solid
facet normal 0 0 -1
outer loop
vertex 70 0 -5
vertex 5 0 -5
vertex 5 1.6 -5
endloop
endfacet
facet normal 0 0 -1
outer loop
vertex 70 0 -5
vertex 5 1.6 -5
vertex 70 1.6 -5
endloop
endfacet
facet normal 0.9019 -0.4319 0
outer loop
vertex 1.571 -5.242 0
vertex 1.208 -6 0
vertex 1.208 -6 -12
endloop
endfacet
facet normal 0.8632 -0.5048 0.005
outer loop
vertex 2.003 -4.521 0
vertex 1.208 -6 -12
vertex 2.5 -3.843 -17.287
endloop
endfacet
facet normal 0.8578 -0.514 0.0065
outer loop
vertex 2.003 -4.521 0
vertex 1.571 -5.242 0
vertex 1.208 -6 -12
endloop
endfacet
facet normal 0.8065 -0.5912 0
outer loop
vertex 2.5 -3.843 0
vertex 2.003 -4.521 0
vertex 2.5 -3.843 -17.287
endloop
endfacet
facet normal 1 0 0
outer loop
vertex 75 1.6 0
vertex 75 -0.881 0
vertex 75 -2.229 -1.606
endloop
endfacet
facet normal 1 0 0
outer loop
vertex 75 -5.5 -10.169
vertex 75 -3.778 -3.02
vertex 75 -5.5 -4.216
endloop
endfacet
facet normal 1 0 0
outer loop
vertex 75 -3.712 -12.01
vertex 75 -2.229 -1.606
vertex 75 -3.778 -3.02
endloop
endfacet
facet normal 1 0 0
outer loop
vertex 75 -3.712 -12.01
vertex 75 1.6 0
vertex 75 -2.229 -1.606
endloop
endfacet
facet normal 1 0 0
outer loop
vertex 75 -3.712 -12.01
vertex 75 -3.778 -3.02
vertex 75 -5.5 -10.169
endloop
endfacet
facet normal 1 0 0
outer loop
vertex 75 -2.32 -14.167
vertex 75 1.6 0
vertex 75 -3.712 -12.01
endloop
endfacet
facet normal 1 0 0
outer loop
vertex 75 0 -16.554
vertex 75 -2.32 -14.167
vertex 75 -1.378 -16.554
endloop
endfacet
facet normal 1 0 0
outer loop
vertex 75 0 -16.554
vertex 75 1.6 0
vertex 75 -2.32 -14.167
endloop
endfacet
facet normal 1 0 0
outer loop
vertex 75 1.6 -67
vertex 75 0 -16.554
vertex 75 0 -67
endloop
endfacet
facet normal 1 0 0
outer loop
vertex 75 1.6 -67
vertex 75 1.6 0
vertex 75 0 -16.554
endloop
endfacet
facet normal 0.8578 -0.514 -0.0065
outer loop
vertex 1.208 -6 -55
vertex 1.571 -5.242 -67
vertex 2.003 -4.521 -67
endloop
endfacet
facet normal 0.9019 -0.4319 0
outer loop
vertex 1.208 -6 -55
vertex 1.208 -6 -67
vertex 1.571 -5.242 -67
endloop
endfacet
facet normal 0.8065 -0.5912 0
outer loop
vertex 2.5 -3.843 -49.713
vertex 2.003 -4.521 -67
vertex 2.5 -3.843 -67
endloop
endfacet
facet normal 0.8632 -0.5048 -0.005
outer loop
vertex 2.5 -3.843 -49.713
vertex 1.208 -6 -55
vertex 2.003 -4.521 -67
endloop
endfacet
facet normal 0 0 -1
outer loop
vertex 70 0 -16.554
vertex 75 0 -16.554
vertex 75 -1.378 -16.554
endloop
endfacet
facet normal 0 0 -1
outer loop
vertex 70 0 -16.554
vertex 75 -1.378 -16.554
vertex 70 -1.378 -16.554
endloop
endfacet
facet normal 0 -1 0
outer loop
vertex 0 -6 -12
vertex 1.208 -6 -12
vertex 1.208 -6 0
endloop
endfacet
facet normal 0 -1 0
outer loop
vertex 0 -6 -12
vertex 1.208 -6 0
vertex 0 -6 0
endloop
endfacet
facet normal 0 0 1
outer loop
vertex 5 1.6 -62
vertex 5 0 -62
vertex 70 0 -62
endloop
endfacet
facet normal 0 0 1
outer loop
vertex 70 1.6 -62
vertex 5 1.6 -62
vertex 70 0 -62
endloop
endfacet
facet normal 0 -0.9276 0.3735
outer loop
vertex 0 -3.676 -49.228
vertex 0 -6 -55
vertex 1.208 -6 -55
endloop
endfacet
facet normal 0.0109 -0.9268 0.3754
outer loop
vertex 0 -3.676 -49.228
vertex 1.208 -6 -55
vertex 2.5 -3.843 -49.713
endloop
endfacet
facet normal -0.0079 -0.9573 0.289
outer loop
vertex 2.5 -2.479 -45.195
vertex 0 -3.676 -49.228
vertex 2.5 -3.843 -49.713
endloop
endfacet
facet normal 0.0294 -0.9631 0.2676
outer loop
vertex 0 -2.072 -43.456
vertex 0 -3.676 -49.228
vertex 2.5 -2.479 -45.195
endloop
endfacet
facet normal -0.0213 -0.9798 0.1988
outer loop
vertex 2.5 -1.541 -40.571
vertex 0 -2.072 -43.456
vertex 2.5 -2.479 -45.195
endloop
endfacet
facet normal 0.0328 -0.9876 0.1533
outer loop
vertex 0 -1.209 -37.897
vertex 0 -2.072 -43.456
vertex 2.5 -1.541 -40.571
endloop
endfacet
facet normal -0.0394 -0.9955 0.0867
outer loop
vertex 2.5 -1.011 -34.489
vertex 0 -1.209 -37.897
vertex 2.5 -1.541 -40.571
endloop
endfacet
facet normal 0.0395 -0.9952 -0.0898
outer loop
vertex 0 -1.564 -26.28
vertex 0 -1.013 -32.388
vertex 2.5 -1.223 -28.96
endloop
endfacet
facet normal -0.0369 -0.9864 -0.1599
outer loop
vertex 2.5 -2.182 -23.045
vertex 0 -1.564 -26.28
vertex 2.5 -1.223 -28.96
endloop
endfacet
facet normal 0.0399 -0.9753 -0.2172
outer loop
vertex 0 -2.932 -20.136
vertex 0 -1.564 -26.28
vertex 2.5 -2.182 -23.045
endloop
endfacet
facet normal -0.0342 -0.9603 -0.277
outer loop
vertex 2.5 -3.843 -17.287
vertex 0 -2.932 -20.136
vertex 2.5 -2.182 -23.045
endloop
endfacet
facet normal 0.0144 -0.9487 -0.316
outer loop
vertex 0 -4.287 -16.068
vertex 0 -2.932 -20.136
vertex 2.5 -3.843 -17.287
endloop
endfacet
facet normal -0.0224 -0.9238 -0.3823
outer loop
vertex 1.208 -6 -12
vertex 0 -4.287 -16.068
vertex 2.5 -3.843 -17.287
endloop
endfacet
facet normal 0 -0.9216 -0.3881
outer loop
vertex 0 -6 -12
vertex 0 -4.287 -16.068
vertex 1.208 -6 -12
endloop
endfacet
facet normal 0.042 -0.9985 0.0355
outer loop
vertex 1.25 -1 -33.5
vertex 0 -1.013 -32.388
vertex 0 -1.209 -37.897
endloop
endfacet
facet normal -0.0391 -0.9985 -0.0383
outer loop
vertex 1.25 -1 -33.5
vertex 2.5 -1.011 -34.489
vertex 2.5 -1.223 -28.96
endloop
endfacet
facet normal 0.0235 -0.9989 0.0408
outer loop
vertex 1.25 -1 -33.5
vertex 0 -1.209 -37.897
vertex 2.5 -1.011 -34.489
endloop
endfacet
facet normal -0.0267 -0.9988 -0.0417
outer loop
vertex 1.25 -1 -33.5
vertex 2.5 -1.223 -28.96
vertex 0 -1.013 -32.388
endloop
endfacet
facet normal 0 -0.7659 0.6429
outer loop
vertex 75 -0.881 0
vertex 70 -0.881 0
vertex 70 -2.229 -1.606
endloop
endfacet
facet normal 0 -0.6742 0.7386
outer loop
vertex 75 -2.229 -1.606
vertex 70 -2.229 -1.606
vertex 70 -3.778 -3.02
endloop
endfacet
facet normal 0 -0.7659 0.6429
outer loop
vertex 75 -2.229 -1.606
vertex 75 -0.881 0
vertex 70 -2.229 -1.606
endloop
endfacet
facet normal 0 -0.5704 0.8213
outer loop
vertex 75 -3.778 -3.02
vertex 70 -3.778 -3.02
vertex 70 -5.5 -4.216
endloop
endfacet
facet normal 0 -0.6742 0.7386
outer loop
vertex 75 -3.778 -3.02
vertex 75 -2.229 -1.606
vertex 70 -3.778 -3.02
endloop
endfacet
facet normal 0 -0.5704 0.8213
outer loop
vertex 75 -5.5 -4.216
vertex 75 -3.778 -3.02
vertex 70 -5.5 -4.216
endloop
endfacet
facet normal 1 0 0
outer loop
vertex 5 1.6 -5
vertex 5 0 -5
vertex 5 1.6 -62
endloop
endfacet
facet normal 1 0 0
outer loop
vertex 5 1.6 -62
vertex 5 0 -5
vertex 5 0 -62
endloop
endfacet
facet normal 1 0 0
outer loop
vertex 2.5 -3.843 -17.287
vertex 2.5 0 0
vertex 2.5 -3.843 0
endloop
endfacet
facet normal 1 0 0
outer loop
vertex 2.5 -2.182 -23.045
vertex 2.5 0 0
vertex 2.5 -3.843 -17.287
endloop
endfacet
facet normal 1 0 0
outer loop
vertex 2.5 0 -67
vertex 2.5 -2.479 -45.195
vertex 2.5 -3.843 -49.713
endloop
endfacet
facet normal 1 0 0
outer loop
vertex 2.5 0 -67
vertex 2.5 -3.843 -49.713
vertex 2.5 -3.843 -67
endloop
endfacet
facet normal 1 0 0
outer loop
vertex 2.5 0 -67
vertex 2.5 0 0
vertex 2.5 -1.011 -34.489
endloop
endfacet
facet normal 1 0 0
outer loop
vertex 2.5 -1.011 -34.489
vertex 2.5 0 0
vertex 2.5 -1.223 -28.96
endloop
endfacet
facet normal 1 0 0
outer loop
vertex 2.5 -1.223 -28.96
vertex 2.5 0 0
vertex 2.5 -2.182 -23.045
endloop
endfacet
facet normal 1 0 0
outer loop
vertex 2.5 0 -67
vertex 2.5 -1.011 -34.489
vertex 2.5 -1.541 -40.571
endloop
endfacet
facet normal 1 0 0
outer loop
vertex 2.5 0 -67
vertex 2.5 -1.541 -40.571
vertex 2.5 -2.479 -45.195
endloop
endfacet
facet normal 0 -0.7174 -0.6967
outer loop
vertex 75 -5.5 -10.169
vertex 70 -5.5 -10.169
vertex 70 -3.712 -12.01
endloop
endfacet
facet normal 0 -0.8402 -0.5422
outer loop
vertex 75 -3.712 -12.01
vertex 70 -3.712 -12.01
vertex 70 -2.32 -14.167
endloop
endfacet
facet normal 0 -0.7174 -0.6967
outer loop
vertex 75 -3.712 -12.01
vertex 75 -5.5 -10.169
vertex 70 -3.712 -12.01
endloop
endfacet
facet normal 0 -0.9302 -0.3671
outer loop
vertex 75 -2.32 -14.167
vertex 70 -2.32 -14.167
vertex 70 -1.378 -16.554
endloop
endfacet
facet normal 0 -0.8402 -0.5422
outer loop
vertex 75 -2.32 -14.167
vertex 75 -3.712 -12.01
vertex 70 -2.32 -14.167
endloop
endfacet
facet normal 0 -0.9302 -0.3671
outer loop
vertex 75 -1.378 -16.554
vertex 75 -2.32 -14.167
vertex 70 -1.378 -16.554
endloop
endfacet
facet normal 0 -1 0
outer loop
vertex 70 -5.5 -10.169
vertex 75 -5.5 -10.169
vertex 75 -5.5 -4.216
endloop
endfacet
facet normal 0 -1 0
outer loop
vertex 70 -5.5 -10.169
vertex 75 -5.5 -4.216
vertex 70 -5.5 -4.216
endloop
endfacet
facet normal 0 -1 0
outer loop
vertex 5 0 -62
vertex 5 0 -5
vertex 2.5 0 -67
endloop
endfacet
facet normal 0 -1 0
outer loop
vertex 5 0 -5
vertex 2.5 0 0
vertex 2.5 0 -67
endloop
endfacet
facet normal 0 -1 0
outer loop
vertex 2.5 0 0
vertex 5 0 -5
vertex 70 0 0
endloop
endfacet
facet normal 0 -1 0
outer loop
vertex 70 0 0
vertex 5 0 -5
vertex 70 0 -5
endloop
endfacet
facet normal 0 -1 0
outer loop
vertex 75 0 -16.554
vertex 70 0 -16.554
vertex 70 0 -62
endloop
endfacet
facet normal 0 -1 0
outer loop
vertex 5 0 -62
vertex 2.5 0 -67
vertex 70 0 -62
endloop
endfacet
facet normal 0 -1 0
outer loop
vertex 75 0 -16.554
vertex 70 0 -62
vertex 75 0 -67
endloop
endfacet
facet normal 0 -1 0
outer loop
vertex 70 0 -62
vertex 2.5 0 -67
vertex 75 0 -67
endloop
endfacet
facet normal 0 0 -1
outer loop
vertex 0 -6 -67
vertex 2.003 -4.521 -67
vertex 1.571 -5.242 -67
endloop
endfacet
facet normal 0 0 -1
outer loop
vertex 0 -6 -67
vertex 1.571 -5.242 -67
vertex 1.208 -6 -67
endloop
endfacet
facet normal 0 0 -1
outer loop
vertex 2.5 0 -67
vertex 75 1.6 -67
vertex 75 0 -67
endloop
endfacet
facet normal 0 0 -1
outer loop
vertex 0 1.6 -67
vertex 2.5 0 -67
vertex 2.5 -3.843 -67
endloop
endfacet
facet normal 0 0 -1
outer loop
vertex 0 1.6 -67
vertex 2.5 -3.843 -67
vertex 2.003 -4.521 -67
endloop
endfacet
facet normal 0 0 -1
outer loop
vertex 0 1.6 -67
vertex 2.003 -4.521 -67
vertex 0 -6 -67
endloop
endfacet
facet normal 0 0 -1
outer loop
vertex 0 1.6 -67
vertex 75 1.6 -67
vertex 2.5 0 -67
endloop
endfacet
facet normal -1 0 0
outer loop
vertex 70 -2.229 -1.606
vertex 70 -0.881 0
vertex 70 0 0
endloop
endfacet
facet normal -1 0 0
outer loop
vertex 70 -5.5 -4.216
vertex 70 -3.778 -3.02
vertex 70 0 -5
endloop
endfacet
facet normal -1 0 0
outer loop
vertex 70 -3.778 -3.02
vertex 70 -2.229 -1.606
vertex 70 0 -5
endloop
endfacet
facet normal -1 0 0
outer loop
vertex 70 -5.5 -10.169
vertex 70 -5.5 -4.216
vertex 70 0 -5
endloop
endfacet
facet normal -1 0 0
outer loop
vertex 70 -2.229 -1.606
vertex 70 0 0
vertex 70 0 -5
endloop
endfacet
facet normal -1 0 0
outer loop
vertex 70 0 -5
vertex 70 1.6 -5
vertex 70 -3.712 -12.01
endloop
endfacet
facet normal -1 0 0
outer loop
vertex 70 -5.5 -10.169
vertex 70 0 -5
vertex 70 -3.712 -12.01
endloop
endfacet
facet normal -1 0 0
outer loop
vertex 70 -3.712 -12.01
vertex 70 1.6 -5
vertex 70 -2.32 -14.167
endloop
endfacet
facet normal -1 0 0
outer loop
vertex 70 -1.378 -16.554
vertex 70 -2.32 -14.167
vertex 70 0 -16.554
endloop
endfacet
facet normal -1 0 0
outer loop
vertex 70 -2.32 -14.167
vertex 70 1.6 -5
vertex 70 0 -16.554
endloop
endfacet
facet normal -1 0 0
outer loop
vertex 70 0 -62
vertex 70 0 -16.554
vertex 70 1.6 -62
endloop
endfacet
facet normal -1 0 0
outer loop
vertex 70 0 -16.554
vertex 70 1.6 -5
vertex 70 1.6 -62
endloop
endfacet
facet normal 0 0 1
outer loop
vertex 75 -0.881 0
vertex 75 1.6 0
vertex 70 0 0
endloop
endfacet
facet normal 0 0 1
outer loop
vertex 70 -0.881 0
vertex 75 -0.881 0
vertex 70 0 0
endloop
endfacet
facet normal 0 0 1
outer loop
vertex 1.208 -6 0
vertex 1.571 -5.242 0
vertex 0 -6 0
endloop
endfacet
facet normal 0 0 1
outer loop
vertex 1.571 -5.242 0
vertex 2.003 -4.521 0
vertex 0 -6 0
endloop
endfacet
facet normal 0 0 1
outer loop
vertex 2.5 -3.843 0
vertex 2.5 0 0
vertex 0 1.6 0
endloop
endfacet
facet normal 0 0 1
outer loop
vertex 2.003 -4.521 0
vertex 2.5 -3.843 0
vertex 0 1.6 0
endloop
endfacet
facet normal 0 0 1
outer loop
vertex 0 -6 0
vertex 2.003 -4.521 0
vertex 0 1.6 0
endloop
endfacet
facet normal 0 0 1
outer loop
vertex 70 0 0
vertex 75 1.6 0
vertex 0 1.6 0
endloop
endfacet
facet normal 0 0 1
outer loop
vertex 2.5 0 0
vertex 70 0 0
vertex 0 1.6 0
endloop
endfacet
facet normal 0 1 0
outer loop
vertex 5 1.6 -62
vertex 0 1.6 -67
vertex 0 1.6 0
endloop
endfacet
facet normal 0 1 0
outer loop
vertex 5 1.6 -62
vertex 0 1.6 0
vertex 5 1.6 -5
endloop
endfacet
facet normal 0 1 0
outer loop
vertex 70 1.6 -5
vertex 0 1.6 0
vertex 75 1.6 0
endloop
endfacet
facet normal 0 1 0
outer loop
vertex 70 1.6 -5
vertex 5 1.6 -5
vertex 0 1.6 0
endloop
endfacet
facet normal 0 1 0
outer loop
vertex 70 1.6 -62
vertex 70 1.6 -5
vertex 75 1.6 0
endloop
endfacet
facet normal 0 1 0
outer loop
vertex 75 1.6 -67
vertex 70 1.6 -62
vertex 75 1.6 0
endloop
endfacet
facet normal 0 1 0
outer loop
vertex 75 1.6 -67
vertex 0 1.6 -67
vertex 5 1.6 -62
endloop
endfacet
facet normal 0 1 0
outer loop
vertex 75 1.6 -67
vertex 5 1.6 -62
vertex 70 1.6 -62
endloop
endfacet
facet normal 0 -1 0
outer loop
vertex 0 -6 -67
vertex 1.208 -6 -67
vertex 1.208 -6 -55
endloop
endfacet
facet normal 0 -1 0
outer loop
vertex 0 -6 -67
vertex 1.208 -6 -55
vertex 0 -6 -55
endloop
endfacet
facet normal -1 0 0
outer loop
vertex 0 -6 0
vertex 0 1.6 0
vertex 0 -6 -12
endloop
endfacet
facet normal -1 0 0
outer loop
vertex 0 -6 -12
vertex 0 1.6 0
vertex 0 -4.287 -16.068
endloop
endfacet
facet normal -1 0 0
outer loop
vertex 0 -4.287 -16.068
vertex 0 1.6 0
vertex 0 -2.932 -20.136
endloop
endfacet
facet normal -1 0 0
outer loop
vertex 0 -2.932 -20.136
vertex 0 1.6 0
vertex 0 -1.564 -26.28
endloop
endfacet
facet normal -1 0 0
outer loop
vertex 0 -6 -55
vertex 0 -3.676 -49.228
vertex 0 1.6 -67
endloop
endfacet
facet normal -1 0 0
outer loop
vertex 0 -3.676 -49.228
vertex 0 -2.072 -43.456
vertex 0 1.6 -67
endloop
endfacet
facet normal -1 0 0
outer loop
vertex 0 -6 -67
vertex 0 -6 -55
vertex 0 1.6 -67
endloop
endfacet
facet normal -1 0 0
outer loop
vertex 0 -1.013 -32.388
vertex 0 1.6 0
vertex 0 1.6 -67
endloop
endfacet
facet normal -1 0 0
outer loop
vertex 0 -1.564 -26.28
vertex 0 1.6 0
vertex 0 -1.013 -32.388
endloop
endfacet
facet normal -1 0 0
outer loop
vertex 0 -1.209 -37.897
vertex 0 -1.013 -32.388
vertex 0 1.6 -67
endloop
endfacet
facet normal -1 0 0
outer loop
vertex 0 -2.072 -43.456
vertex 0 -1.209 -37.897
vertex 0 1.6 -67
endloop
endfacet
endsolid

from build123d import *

# Parameters (mm, degrees)
SKETCH1_W           = 75
SKETCH1_H           = 67
SKETCH1_W_2         = 65
SKETCH1_H_2         = 57
BOSS_EXTRUDE1_DEPTH = 1.6
SKETCH2_W           = 5
SKETCH2_H           = 16.553638176
BOSS_EXTRUDE2_DEPTH = 5.5
SKETCH3_W           = 2.5
SKETCH3_H           = 67
BOSS_EXTRUDE3_DEPTH = 6
CUT_EXTRUDE1_REACH  = 102.747
CUT_EXTRUDE2_REACH  = 102.747
CUT_EXTRUDE3_REACH  = 102.747


with BuildPart() as part:
    # Sketch1 → Boss-Extrude1 (new body)
    with BuildSketch(Plane(origin=(0, 0, 0), x_dir=(1, 0, 0), z_dir=(0, 1, 0))):
        with Locations((37.5, 33.5)):
            Rectangle(SKETCH1_W, SKETCH1_H)
        with Locations((37.5, 33.5)):
            Rectangle(SKETCH1_W_2, SKETCH1_H_2, mode=Mode.SUBTRACT)
    extrude(amount=BOSS_EXTRUDE1_DEPTH)

    # Sketch2 → Boss-Extrude2 (add)
    with BuildSketch(Plane(origin=(0, 0, 0), x_dir=(-1, 0, 0), z_dir=(0, -1, 0))):
        with Locations((-72.5, 8.276819088)):
            Rectangle(SKETCH2_W, SKETCH2_H)
    extrude(amount=BOSS_EXTRUDE2_DEPTH)

    # Sketch3 → Boss-Extrude3 (add)
    with BuildSketch(Plane(origin=(0, 0, 0), x_dir=(-1, 0, 0), z_dir=(0, -1, 0))):
        with Locations((-1.25, 33.5)):
            Rectangle(SKETCH3_W, SKETCH3_H)
    extrude(amount=BOSS_EXTRUDE3_DEPTH)

    # Sketch4 → Cut-Extrude1 (cut, up to next)
    with BuildSketch(Plane.XY, mode=Mode.PRIVATE) as cut_extrude1_sk1:
        with BuildLine():
            Line((2.5, -3.843145751), (2.5, -6))
            Line((2.5, -6), (1.208438024, -6))
            ThreePointArc((1.208438024, -6), (1.778538223, -4.876253897), (2.5, -3.843145751))
        make_face()
    cut_extrude1_tool1 = extrude(cut_extrude1_sk1.sketch, amount=-CUT_EXTRUDE1_REACH, mode=Mode.PRIVATE) & part.part
    add(cut_extrude1_tool1.solids().sort_by_distance((2.045896, -5.244781, 0))[0], mode=Mode.SUBTRACT)

    # Sketch5 → Cut-Extrude2 (cut, up to next)
    with BuildSketch(Plane.ZY, mode=Mode.PRIVATE) as cut_extrude2_sk1:
        with BuildLine():
            Line((-12, -6), (-55, -6))
            add(Edge.make_bspline(
                [(-55, -6), (-33.5, 4), (-12, -6)],
                knots=[0, 0, 0, 1, 1, 1], degree=2))
        make_face()
    cut_extrude2_tool1 = extrude(cut_extrude2_sk1.sketch, amount=-CUT_EXTRUDE2_REACH, mode=Mode.PRIVATE) & part.part
    add(cut_extrude2_tool1.solids().sort_by_distance((0, -4, -33.5))[0], mode=Mode.SUBTRACT)

    # Sketch6 → Cut-Extrude3 (cut, up to next)
    with BuildSketch(Plane(origin=(75, 0, 0), x_dir=(0, 0, -1), z_dir=(1, 0, 0)), mode=Mode.PRIVATE) as cut_extrude3_sk1:
        with BuildLine():
            Line((16.553638176, -1.377553515), (16.553638176, -5.5))
            Line((16.553638176, -5.5), (10.16876266, -5.5))
            ThreePointArc((10.16876266, -5.5), (13.054139073, -2.963197882), (16.553638176, -1.377553515))
        make_face()
    cut_extrude3_tool1 = extrude(cut_extrude3_sk1.sketch, amount=-CUT_EXTRUDE3_REACH, mode=Mode.PRIVATE) & part.part
    # Sketch6 → Cut-Extrude3 (cut, up to next)
    with BuildSketch(Plane(origin=(75, 0, 0), x_dir=(0, 0, -1), z_dir=(1, 0, 0)), mode=Mode.PRIVATE) as cut_extrude3_sk2:
        with BuildLine():
            Line((4.215785495, -5.5), (0, -5.5))
            Line((0, -5.5), (0, -0.880945509))
            ThreePointArc((0, -0.880945509), (2.338832837, -2.979695012), (4.215785495, -5.5))
        make_face()
    cut_extrude3_tool2 = extrude(cut_extrude3_sk2.sketch, amount=-CUT_EXTRUDE3_REACH, mode=Mode.PRIVATE) & part.part
    add(cut_extrude3_tool1.solids().sort_by_distance((75, -3.96823, -14.212135))[0], mode=Mode.SUBTRACT)
    add(cut_extrude3_tool2.solids().sort_by_distance((75, -3.859275, -1.499307))[0], mode=Mode.SUBTRACT)


solid = part.part
